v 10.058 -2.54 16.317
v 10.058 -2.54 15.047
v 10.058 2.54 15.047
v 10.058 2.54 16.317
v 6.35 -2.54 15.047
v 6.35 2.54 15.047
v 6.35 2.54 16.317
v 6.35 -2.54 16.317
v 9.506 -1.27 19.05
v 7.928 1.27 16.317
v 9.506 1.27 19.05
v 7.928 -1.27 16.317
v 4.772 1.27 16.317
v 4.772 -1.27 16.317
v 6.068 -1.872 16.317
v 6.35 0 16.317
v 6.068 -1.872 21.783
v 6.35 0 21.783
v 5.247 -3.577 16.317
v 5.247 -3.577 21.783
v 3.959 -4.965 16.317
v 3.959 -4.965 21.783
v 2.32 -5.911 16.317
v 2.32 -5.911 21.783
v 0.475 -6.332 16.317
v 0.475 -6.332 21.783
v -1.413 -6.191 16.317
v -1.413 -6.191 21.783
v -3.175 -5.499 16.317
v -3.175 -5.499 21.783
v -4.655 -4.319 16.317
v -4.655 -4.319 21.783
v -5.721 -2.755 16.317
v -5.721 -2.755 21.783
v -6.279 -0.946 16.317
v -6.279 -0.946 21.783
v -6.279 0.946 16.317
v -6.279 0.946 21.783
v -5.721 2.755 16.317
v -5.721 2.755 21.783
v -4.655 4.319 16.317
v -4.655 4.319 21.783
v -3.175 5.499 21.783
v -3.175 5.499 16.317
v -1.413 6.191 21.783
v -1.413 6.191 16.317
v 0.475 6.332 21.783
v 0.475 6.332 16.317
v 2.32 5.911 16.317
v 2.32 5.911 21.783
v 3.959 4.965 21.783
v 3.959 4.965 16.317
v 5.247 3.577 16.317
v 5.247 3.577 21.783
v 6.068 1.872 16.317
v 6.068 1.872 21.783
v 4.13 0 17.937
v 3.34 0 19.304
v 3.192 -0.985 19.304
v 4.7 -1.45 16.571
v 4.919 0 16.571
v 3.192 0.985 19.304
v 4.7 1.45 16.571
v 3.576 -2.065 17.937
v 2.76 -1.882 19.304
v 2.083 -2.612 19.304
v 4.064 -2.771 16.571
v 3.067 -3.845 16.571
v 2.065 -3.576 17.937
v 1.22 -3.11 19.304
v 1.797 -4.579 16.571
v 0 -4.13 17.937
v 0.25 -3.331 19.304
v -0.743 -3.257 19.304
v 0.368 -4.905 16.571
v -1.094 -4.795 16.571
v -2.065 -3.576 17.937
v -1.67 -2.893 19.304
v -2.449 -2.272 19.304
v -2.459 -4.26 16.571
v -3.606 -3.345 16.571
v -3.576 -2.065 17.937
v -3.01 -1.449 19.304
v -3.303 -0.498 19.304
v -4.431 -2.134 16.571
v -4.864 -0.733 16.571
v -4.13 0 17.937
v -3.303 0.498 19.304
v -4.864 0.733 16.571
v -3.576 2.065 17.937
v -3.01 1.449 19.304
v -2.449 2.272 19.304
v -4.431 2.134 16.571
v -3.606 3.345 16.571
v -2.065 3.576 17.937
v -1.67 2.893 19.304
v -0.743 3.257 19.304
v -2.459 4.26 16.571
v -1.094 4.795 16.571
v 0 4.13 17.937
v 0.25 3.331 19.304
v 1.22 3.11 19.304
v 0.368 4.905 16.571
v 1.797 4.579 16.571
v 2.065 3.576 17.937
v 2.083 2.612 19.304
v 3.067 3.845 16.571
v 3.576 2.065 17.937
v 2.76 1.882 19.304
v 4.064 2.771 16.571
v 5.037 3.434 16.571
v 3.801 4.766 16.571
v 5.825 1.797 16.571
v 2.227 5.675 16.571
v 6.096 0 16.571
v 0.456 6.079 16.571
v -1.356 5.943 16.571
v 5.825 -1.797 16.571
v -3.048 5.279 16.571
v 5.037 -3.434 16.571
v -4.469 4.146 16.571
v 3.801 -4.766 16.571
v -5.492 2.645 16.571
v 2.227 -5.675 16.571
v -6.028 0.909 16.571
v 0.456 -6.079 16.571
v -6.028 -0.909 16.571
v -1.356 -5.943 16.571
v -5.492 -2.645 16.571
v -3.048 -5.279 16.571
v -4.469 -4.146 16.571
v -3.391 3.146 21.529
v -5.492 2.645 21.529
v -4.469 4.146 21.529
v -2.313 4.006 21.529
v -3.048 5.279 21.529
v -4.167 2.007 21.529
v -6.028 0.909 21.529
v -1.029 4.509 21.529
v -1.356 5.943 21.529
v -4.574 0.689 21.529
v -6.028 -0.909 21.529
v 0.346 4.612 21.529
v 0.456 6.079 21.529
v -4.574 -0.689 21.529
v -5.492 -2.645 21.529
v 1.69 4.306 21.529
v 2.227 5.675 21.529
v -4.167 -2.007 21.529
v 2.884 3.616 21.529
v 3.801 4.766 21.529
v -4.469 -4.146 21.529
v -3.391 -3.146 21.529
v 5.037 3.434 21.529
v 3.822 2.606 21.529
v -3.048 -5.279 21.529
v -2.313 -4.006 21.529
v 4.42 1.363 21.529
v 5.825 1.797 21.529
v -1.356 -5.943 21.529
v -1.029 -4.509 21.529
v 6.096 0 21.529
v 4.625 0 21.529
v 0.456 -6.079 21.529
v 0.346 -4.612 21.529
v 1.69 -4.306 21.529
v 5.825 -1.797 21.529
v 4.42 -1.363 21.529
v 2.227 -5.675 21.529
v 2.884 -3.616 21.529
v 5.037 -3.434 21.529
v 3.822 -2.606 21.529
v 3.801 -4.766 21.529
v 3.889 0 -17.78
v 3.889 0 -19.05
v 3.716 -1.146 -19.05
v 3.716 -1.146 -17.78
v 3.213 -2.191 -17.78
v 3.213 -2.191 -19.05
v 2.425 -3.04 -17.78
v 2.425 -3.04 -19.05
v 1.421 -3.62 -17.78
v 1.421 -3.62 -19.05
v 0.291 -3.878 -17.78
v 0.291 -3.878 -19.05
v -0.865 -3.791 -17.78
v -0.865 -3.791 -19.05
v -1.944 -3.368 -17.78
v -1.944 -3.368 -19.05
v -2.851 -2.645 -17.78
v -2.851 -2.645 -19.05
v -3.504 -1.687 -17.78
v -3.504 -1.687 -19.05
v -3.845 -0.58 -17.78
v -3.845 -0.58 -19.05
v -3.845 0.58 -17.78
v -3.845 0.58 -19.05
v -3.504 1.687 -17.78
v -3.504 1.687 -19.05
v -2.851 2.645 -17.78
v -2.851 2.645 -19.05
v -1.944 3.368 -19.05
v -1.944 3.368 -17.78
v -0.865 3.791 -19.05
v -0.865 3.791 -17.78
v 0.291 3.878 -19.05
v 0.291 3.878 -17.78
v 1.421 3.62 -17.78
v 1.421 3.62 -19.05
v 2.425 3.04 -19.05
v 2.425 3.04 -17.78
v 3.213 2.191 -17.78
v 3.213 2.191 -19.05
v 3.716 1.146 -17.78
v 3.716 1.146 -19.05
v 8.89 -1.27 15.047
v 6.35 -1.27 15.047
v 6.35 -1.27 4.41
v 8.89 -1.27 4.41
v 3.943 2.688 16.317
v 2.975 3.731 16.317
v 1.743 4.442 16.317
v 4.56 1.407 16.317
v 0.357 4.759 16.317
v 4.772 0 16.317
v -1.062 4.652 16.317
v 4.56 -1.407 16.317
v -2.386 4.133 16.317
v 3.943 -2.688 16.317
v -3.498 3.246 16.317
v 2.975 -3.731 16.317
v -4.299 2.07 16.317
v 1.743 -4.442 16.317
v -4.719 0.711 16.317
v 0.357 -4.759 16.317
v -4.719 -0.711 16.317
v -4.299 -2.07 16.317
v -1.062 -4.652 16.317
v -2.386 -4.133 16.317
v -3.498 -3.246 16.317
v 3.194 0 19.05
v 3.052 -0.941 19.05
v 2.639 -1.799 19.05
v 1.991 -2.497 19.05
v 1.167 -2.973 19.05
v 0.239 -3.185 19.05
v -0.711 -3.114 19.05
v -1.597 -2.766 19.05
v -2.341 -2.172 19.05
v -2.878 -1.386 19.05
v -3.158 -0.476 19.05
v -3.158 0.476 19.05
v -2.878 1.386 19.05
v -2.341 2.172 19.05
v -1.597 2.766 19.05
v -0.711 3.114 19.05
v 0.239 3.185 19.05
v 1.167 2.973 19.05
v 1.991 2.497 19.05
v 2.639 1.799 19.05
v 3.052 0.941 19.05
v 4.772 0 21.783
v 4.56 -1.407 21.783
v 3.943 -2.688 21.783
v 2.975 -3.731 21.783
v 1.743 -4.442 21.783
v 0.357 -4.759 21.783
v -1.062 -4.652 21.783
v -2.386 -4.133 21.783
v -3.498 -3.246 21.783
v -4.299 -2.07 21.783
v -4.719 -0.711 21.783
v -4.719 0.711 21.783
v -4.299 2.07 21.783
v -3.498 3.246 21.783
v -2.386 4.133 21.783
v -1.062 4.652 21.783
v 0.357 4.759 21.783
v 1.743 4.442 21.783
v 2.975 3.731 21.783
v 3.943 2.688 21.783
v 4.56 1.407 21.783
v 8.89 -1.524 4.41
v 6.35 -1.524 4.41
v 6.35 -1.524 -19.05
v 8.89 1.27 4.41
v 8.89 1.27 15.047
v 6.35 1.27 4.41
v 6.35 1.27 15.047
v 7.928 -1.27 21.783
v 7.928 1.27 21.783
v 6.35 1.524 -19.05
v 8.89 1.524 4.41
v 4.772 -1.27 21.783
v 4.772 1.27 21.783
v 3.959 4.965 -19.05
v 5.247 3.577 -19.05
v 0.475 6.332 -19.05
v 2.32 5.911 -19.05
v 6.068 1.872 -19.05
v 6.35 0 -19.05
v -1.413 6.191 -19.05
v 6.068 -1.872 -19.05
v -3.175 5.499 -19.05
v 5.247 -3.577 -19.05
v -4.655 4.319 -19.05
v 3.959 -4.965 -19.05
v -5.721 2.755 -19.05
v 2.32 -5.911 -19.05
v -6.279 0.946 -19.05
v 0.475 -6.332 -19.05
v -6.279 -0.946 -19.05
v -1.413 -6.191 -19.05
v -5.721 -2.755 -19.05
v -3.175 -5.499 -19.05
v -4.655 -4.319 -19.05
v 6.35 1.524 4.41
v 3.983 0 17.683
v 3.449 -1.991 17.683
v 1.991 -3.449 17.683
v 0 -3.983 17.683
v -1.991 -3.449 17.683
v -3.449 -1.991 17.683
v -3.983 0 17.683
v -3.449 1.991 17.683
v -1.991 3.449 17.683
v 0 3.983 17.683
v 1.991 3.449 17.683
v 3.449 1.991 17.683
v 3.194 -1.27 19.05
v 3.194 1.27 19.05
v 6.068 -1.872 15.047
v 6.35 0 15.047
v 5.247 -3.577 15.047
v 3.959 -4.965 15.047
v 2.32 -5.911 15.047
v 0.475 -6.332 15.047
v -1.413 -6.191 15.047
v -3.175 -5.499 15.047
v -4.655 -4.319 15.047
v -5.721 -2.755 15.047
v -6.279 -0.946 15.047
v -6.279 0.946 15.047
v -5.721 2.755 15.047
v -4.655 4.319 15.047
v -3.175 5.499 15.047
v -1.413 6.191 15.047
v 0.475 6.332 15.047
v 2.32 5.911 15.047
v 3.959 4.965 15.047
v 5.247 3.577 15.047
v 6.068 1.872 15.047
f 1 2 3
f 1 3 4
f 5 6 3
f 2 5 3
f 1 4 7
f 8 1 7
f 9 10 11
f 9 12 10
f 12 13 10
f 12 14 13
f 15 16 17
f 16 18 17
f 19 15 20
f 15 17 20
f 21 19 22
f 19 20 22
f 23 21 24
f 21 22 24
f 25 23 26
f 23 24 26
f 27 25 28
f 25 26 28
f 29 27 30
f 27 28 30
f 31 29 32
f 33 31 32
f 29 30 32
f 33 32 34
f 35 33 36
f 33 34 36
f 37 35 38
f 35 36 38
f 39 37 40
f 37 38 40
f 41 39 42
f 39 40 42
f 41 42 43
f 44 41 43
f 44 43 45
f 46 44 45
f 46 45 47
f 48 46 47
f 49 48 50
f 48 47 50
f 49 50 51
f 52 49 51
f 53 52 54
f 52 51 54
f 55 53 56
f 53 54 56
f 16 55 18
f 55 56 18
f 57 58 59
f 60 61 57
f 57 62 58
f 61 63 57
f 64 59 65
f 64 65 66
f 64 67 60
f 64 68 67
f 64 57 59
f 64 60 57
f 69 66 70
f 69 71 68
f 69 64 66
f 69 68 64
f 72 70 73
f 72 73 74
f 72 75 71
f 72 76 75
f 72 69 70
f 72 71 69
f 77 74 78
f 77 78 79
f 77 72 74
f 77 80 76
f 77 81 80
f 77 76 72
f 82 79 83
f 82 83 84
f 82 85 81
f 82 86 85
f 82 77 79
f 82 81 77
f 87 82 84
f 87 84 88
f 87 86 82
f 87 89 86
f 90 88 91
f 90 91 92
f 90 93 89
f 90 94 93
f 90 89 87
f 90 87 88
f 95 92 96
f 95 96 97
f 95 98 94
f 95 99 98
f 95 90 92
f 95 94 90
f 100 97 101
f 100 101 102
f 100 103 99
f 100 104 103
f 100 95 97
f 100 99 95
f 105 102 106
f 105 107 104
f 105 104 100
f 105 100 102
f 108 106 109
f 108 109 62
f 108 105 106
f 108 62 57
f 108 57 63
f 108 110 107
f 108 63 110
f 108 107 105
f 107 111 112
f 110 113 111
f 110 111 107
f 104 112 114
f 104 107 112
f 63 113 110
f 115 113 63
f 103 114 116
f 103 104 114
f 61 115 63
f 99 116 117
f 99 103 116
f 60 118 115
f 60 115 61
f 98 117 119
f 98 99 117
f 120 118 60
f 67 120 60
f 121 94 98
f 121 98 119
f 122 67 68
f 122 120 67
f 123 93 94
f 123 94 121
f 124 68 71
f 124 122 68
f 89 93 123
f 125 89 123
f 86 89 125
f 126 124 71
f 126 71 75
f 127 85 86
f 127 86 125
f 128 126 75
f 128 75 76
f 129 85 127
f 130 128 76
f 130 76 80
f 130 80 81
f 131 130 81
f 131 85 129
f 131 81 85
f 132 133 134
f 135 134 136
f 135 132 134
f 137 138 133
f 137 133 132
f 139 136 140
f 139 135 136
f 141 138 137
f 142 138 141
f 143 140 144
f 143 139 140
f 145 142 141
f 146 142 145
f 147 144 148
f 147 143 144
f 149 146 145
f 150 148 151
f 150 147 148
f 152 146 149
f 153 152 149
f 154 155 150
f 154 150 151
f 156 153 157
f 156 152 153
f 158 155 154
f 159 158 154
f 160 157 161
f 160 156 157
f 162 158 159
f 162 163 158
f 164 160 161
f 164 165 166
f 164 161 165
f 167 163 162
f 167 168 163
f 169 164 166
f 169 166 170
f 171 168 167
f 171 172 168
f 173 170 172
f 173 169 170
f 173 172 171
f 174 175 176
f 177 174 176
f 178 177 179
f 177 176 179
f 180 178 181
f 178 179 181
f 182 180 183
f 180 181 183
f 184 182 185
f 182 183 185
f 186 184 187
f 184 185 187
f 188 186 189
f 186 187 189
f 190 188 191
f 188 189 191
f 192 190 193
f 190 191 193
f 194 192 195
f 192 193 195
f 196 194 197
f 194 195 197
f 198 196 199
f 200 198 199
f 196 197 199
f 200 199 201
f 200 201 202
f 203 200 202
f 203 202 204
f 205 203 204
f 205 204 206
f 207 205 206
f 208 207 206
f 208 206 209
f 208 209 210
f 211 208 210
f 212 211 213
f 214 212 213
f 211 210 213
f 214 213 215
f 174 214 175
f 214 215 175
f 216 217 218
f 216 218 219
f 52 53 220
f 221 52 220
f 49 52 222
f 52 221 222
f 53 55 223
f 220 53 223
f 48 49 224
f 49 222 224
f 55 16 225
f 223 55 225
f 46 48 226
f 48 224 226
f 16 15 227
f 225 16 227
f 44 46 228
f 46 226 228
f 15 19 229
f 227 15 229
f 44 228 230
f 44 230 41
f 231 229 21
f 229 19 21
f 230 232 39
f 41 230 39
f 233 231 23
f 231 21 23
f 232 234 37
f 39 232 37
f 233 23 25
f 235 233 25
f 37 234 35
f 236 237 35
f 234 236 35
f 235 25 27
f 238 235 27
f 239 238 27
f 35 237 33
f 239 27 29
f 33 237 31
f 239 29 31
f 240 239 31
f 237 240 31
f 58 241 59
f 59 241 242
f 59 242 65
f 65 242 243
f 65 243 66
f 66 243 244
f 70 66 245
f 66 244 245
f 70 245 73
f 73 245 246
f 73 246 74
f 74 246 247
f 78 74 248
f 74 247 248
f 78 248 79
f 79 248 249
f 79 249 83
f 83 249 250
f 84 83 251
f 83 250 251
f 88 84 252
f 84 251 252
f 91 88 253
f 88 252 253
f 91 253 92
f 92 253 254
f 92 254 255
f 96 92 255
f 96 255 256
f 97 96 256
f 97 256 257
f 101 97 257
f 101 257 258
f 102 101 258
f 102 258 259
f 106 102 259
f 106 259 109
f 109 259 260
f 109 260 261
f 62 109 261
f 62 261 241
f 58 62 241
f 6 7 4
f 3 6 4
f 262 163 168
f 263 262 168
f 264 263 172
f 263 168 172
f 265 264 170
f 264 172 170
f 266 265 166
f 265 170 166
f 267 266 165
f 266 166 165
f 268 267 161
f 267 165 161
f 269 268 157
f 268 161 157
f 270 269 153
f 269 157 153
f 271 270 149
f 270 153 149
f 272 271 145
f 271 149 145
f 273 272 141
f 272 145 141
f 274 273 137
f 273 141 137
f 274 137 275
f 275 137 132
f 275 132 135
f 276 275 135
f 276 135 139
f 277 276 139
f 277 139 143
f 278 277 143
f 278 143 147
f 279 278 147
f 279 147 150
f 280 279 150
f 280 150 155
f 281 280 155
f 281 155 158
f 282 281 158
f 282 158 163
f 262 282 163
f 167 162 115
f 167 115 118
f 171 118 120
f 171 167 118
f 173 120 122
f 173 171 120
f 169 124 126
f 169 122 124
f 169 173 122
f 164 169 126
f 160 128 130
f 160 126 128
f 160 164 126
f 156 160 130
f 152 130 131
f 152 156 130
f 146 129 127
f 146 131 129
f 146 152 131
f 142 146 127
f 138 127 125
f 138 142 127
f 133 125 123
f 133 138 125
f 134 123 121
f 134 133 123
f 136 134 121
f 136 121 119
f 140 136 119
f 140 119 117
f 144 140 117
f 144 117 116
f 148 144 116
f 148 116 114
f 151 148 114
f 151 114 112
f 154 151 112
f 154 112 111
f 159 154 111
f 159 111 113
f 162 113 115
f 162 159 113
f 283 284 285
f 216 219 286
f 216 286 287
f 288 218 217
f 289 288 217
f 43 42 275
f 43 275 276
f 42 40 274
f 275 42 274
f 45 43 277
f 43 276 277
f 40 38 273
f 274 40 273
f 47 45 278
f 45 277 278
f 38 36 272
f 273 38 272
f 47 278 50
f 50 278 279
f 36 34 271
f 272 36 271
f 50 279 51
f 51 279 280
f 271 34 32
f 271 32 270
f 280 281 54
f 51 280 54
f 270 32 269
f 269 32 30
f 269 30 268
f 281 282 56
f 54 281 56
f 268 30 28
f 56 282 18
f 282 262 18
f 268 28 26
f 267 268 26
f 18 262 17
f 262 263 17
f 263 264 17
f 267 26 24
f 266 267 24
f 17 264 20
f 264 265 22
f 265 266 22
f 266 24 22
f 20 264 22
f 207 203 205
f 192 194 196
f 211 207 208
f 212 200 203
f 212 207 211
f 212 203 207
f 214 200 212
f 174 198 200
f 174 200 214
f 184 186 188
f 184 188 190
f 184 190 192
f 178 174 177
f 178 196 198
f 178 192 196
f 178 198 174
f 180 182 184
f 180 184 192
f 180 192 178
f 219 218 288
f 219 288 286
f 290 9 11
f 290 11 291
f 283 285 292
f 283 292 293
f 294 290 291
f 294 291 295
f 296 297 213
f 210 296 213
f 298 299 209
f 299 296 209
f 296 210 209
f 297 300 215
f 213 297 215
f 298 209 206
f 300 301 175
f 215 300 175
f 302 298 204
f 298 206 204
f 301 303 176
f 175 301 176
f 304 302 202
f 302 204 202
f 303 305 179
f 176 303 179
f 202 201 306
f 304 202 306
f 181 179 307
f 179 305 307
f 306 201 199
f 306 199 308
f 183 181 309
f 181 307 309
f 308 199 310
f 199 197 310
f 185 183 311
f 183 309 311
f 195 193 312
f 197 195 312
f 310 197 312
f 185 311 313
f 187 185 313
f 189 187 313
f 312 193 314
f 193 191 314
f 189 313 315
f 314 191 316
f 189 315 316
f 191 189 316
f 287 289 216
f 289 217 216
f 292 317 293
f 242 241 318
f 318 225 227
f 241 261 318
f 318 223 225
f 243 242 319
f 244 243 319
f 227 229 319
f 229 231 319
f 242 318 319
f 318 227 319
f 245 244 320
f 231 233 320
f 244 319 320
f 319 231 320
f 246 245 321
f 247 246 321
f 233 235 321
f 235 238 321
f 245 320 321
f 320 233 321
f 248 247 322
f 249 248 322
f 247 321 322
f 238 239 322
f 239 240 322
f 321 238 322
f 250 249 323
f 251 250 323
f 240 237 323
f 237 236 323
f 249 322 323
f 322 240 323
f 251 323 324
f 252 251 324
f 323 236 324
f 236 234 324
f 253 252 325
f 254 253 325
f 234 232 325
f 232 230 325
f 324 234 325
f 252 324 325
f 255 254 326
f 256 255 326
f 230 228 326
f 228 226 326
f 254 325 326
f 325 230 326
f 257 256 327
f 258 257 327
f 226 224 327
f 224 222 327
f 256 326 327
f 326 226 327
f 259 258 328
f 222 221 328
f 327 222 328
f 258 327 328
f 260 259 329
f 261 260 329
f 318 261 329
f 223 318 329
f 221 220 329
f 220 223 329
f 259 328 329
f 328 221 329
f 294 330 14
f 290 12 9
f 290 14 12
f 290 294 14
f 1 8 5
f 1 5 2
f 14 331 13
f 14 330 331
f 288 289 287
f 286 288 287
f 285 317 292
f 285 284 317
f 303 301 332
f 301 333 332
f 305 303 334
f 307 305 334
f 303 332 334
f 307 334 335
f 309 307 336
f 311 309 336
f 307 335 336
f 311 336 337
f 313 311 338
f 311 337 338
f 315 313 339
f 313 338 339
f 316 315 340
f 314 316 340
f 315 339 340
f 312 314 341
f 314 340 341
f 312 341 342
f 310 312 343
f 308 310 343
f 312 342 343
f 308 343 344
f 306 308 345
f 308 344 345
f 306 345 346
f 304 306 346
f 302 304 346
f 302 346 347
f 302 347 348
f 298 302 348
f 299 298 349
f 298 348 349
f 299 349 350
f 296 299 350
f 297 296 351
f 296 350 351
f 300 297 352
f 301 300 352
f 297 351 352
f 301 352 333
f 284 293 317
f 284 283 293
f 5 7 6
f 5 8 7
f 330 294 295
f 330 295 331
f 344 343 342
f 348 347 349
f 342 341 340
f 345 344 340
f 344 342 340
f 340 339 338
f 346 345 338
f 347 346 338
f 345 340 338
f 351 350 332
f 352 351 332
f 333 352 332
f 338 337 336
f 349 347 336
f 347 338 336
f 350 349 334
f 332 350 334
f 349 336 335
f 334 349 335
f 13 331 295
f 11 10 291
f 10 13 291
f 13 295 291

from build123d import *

# Parameters (mm, degrees)
F3_DEPTH = 1.524
F0_W     = 2.54
F0_H     = 10.6366808762
F4_DEPTH = 1.27
F7_DEPTH = 2.54
F5_DEPTH = 1.27
F6_T     = -0.254
F8_R     = 3.8887295668
F9_DEPTH = 1.27


with BuildPart() as f1:
    # F0 (on Front) → F1 (revolve)
    with BuildSketch(Plane.XZ):
        Polygon((0, -19.05), (6.35, -19.05), (6.35, 4.4099774687), (6.35, 15.0466583449), (0, 15.0466583449), align=None)
    revolve(axis=Axis((0, 0, 1.4181472361), (0, 0, -1)))

    # F8 (on face) → F9 (cut)
    with BuildSketch(Plane(origin=(0, 0, -19.05), x_dir=(1, 0, 0), z_dir=(0, 0, -1))):
        Circle(F8_R)
    extrude(amount=-F9_DEPTH, mode=Mode.SUBTRACT)


with BuildPart() as f2:
    # F0 (on Front) → F2 (revolve)
    with BuildSketch(Plane.XZ):
        Polygon((4.7719044596, 16.3166583449), (6.35, 16.3166583449), (6.35, 19.05), (3.1938089192, 19.05), align=None)
        Polygon((4.7719044596, 21.7833416551), (3.1938089192, 19.05), (6.35, 19.05), (6.35, 21.7833416551), align=None)
    revolve(axis=Axis((0, 0, 1.4181472361), (0, 0, -1)))

    # F6
    f6_openings = [f2.faces().sort_by_distance(p)[0] for p in [
        (-3.982857, 0, 20.416671),
    ]]
    offset(amount=F6_T, openings=f6_openings)


with BuildPart() as f3:
    # F0 (on Front) → F3 (new body, symmetric)
    with BuildSketch(Plane.XZ):
        Polygon((6.35, 4.4099774687), (6.35, -19.05), (8.89, 4.4099774687), align=None)
    extrude(amount=F3_DEPTH, both=True)


with BuildPart() as f4:
    # F0 (on Front) → F4 (new body, symmetric)
    with BuildSketch(Plane.XZ):
        with Locations((7.62, 9.7283179068)):
            Rectangle(F0_W, F0_H)
    extrude(amount=F4_DEPTH, both=True)


with BuildPart() as f7:
    # F0 (on Front) → F7 (new body, symmetric)
    with BuildSketch(Plane.XZ):
        Polygon((6.35, 16.3166583449), (6.35, 15.0466583449), (8.89, 15.0466583449), (10.0584103287, 15.0466583449), (10.0584103287, 16.3166583449), (7.9280955404, 16.3166583449), align=None)
    extrude(amount=F7_DEPTH, both=True)


with BuildPart() as f5:
    # F0 (on Front) → F5 (new body, symmetric)
    with BuildSketch(Plane.XZ):
        Polygon((6.35, 19.05), (6.35, 16.3166583449), (7.9280955404, 16.3166583449), (9.5061910808, 19.05), (7.9280955404, 21.7833416551), (6.35, 21.7833416551), align=None)
        Polygon((4.7719044596, 21.7833416551), (3.1938089192, 19.05), (6.35, 19.05), (6.35, 21.7833416551), align=None)
        Polygon((4.7719044596, 16.3166583449), (6.35, 16.3166583449), (6.35, 19.05), (3.1938089192, 19.05), align=None)
    extrude(amount=F5_DEPTH, both=True)


solid = Compound([f1.part, f2.part, f3.part, f4.part, f7.part, f5.part])
